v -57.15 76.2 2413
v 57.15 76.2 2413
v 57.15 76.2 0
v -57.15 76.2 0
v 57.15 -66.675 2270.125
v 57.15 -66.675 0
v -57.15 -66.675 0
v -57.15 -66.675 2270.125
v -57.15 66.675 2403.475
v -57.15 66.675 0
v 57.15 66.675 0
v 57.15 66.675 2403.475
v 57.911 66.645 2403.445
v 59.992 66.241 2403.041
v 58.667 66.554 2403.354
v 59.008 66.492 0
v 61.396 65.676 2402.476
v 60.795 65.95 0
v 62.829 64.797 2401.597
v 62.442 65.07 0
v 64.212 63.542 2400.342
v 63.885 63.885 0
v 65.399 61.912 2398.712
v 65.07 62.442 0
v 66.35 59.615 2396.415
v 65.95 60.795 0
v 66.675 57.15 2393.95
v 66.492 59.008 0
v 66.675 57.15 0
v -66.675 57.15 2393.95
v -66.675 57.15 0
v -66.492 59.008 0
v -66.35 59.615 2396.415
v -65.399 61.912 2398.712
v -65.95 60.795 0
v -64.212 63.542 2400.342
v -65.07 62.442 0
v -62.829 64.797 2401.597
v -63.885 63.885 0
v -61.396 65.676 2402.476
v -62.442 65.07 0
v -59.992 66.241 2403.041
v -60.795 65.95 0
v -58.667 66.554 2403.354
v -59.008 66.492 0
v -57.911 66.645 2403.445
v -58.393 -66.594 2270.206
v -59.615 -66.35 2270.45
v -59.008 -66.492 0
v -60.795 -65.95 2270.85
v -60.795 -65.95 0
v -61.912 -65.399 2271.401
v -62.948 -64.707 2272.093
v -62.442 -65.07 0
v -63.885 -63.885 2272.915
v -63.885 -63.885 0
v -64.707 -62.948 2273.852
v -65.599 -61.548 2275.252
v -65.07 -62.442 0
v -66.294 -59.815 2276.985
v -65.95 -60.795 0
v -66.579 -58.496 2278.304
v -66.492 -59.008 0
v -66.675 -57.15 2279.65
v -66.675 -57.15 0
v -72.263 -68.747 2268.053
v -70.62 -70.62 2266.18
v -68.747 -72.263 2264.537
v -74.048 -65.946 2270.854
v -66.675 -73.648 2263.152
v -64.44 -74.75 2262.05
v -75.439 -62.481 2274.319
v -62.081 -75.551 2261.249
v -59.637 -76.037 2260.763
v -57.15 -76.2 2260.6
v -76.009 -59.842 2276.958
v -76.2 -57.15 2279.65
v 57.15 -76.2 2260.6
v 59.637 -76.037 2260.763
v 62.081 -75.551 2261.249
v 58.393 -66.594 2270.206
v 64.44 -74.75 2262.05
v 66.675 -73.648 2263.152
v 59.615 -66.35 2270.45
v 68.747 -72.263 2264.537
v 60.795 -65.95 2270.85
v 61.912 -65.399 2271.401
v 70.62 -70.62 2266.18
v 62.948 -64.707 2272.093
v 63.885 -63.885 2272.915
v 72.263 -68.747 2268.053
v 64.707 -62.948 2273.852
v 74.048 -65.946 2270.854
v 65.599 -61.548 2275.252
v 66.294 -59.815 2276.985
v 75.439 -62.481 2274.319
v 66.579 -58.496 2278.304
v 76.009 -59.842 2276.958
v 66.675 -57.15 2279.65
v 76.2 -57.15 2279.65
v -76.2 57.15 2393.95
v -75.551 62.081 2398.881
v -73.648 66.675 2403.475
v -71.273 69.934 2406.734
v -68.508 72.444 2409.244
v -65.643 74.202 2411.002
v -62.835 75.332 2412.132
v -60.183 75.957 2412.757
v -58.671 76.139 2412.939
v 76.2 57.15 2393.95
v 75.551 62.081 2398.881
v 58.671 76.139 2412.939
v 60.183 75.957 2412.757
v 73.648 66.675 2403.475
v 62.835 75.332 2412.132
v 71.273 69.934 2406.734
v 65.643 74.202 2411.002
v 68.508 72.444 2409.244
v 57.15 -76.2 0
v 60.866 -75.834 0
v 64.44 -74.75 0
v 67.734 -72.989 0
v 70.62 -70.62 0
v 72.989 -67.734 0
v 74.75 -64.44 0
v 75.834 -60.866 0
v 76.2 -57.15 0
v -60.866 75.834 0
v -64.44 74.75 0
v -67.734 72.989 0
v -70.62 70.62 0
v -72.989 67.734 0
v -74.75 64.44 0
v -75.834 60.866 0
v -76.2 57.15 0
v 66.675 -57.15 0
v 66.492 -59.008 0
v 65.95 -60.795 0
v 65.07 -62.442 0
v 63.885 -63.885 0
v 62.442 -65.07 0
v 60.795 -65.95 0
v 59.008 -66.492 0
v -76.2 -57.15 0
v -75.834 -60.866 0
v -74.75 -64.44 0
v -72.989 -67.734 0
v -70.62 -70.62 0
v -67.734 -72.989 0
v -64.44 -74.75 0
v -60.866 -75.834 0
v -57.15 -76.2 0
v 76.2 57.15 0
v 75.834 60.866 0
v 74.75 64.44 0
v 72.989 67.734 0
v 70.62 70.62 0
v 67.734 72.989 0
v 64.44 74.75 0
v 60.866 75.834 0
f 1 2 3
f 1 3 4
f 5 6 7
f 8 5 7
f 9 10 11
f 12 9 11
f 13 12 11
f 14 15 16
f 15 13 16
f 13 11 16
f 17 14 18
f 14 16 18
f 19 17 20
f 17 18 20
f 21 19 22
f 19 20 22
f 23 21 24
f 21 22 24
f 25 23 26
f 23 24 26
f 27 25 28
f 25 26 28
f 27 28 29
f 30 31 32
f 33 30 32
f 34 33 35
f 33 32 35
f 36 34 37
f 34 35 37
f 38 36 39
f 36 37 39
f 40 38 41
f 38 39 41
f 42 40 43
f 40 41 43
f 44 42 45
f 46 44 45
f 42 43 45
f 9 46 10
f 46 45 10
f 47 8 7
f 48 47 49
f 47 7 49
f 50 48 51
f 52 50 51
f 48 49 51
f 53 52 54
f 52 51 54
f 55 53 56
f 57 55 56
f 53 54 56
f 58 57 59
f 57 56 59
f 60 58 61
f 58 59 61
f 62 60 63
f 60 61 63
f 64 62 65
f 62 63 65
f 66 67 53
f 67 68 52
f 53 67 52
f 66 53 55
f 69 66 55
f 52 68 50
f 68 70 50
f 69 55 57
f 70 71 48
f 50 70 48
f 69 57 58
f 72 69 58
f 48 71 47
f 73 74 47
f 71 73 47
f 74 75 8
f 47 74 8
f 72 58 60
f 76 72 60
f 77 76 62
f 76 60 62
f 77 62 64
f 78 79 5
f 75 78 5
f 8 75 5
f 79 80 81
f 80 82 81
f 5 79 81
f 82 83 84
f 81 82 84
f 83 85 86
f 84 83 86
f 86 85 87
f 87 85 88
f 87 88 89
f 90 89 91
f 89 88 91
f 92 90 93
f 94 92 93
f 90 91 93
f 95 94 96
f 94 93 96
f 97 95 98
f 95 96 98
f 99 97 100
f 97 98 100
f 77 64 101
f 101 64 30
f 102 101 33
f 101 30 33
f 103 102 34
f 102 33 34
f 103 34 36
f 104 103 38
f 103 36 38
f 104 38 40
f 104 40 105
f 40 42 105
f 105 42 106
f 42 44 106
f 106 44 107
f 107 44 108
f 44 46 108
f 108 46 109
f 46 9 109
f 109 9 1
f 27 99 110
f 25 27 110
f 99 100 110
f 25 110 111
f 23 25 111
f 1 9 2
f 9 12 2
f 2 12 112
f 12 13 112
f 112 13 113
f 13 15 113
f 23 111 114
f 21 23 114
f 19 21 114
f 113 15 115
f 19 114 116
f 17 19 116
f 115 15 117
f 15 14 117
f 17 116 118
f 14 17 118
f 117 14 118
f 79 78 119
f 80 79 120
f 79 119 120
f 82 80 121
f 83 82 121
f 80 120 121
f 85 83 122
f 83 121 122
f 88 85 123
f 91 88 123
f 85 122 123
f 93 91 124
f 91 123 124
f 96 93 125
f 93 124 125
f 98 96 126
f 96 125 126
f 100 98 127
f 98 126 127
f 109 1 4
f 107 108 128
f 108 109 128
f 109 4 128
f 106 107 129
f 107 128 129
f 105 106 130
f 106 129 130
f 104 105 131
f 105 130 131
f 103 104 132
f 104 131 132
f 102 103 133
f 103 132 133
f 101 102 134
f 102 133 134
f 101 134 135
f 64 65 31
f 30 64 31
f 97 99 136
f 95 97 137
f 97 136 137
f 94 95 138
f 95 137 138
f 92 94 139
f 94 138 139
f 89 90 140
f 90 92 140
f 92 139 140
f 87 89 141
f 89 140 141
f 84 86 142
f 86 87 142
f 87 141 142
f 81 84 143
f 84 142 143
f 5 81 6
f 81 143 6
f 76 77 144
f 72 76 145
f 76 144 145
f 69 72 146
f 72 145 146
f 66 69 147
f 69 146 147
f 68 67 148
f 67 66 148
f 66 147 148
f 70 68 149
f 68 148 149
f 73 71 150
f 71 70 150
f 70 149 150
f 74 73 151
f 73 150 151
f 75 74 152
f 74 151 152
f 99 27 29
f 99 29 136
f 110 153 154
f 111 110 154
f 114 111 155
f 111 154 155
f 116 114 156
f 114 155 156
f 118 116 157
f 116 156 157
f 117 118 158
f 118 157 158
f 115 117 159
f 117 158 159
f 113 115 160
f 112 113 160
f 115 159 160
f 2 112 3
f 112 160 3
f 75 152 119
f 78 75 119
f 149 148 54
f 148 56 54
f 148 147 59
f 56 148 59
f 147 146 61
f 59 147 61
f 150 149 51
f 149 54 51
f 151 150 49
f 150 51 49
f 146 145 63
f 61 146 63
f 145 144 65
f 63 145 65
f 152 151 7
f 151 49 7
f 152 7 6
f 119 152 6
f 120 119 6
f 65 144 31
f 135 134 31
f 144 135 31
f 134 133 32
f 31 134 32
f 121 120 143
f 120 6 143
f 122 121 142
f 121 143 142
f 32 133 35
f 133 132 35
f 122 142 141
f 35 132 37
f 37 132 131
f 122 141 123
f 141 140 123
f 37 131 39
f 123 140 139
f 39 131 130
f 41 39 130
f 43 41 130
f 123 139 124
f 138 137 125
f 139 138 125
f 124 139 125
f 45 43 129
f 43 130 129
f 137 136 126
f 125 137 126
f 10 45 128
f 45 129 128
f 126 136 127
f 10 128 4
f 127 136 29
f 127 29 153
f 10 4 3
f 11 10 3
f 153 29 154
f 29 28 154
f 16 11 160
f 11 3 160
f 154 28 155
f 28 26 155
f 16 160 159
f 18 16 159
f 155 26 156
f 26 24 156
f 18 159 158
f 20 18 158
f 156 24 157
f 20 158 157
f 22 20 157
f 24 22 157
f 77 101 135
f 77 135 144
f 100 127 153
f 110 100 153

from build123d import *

# Parameters (mm, degrees)
F1_DEPTH      = 2413
F3_DEPTH      = 76.201
F3_DEPTH_BACK = 76.201


with BuildPart() as f1:
    # F0 (on Top) → F1 (new body)
    with BuildSketch(Plane.XY):
        with BuildLine():
            ThreePointArc((-76.2, -57.15), (-70.6203841816, -70.6203841816), (-57.15, -76.2))
            Line((-57.15, -76.2), (57.15, -76.2))
            ThreePointArc((57.15, -76.2), (70.6203841816, -70.6203841816), (76.2, -57.15))
            Line((76.2, -57.15), (76.2, 57.15))
            ThreePointArc((76.2, 57.15), (70.6203841816, 70.6203841816), (57.15, 76.2))
            Line((57.15, 76.2), (-57.15, 76.2))
            ThreePointArc((-57.15, 76.2), (-70.6203841816, 70.6203841816), (-76.2, 57.15))
            Line((-76.2, 57.15), (-76.2, -57.15))
        make_face()
        with BuildLine():
            Line((57.15, -66.675), (-57.15, -66.675))
            ThreePointArc((-57.15, -66.675), (-63.8851920908, -63.8851920908), (-66.675, -57.15))
            Line((-66.675, -57.15), (-66.675, 57.15))
            ThreePointArc((-66.675, 57.15), (-63.8851920908, 63.8851920908), (-57.15, 66.675))
            Line((-57.15, 66.675), (57.15, 66.675))
            ThreePointArc((57.15, 66.675), (63.8851920908, 63.8851920908), (66.675, 57.15))
            Line((66.675, 57.15), (66.675, -57.15))
            ThreePointArc((66.675, -57.15), (63.8851920908, -63.8851920908), (57.15, -66.675))
        make_face(mode=Mode.SUBTRACT)
    extrude(amount=F1_DEPTH)

    # F2 (on Right) → F3 (cut, two sides)
    with BuildSketch(Plane.YZ) as f3_sk:
        Polygon((76.2, 2413), (-76.2, 2413), (-76.2, 2260.6), align=None)
    extrude(amount=-F3_DEPTH, mode=Mode.SUBTRACT)
    extrude(f3_sk.sketch, amount=F3_DEPTH_BACK, mode=Mode.SUBTRACT)


solid = f1.part
